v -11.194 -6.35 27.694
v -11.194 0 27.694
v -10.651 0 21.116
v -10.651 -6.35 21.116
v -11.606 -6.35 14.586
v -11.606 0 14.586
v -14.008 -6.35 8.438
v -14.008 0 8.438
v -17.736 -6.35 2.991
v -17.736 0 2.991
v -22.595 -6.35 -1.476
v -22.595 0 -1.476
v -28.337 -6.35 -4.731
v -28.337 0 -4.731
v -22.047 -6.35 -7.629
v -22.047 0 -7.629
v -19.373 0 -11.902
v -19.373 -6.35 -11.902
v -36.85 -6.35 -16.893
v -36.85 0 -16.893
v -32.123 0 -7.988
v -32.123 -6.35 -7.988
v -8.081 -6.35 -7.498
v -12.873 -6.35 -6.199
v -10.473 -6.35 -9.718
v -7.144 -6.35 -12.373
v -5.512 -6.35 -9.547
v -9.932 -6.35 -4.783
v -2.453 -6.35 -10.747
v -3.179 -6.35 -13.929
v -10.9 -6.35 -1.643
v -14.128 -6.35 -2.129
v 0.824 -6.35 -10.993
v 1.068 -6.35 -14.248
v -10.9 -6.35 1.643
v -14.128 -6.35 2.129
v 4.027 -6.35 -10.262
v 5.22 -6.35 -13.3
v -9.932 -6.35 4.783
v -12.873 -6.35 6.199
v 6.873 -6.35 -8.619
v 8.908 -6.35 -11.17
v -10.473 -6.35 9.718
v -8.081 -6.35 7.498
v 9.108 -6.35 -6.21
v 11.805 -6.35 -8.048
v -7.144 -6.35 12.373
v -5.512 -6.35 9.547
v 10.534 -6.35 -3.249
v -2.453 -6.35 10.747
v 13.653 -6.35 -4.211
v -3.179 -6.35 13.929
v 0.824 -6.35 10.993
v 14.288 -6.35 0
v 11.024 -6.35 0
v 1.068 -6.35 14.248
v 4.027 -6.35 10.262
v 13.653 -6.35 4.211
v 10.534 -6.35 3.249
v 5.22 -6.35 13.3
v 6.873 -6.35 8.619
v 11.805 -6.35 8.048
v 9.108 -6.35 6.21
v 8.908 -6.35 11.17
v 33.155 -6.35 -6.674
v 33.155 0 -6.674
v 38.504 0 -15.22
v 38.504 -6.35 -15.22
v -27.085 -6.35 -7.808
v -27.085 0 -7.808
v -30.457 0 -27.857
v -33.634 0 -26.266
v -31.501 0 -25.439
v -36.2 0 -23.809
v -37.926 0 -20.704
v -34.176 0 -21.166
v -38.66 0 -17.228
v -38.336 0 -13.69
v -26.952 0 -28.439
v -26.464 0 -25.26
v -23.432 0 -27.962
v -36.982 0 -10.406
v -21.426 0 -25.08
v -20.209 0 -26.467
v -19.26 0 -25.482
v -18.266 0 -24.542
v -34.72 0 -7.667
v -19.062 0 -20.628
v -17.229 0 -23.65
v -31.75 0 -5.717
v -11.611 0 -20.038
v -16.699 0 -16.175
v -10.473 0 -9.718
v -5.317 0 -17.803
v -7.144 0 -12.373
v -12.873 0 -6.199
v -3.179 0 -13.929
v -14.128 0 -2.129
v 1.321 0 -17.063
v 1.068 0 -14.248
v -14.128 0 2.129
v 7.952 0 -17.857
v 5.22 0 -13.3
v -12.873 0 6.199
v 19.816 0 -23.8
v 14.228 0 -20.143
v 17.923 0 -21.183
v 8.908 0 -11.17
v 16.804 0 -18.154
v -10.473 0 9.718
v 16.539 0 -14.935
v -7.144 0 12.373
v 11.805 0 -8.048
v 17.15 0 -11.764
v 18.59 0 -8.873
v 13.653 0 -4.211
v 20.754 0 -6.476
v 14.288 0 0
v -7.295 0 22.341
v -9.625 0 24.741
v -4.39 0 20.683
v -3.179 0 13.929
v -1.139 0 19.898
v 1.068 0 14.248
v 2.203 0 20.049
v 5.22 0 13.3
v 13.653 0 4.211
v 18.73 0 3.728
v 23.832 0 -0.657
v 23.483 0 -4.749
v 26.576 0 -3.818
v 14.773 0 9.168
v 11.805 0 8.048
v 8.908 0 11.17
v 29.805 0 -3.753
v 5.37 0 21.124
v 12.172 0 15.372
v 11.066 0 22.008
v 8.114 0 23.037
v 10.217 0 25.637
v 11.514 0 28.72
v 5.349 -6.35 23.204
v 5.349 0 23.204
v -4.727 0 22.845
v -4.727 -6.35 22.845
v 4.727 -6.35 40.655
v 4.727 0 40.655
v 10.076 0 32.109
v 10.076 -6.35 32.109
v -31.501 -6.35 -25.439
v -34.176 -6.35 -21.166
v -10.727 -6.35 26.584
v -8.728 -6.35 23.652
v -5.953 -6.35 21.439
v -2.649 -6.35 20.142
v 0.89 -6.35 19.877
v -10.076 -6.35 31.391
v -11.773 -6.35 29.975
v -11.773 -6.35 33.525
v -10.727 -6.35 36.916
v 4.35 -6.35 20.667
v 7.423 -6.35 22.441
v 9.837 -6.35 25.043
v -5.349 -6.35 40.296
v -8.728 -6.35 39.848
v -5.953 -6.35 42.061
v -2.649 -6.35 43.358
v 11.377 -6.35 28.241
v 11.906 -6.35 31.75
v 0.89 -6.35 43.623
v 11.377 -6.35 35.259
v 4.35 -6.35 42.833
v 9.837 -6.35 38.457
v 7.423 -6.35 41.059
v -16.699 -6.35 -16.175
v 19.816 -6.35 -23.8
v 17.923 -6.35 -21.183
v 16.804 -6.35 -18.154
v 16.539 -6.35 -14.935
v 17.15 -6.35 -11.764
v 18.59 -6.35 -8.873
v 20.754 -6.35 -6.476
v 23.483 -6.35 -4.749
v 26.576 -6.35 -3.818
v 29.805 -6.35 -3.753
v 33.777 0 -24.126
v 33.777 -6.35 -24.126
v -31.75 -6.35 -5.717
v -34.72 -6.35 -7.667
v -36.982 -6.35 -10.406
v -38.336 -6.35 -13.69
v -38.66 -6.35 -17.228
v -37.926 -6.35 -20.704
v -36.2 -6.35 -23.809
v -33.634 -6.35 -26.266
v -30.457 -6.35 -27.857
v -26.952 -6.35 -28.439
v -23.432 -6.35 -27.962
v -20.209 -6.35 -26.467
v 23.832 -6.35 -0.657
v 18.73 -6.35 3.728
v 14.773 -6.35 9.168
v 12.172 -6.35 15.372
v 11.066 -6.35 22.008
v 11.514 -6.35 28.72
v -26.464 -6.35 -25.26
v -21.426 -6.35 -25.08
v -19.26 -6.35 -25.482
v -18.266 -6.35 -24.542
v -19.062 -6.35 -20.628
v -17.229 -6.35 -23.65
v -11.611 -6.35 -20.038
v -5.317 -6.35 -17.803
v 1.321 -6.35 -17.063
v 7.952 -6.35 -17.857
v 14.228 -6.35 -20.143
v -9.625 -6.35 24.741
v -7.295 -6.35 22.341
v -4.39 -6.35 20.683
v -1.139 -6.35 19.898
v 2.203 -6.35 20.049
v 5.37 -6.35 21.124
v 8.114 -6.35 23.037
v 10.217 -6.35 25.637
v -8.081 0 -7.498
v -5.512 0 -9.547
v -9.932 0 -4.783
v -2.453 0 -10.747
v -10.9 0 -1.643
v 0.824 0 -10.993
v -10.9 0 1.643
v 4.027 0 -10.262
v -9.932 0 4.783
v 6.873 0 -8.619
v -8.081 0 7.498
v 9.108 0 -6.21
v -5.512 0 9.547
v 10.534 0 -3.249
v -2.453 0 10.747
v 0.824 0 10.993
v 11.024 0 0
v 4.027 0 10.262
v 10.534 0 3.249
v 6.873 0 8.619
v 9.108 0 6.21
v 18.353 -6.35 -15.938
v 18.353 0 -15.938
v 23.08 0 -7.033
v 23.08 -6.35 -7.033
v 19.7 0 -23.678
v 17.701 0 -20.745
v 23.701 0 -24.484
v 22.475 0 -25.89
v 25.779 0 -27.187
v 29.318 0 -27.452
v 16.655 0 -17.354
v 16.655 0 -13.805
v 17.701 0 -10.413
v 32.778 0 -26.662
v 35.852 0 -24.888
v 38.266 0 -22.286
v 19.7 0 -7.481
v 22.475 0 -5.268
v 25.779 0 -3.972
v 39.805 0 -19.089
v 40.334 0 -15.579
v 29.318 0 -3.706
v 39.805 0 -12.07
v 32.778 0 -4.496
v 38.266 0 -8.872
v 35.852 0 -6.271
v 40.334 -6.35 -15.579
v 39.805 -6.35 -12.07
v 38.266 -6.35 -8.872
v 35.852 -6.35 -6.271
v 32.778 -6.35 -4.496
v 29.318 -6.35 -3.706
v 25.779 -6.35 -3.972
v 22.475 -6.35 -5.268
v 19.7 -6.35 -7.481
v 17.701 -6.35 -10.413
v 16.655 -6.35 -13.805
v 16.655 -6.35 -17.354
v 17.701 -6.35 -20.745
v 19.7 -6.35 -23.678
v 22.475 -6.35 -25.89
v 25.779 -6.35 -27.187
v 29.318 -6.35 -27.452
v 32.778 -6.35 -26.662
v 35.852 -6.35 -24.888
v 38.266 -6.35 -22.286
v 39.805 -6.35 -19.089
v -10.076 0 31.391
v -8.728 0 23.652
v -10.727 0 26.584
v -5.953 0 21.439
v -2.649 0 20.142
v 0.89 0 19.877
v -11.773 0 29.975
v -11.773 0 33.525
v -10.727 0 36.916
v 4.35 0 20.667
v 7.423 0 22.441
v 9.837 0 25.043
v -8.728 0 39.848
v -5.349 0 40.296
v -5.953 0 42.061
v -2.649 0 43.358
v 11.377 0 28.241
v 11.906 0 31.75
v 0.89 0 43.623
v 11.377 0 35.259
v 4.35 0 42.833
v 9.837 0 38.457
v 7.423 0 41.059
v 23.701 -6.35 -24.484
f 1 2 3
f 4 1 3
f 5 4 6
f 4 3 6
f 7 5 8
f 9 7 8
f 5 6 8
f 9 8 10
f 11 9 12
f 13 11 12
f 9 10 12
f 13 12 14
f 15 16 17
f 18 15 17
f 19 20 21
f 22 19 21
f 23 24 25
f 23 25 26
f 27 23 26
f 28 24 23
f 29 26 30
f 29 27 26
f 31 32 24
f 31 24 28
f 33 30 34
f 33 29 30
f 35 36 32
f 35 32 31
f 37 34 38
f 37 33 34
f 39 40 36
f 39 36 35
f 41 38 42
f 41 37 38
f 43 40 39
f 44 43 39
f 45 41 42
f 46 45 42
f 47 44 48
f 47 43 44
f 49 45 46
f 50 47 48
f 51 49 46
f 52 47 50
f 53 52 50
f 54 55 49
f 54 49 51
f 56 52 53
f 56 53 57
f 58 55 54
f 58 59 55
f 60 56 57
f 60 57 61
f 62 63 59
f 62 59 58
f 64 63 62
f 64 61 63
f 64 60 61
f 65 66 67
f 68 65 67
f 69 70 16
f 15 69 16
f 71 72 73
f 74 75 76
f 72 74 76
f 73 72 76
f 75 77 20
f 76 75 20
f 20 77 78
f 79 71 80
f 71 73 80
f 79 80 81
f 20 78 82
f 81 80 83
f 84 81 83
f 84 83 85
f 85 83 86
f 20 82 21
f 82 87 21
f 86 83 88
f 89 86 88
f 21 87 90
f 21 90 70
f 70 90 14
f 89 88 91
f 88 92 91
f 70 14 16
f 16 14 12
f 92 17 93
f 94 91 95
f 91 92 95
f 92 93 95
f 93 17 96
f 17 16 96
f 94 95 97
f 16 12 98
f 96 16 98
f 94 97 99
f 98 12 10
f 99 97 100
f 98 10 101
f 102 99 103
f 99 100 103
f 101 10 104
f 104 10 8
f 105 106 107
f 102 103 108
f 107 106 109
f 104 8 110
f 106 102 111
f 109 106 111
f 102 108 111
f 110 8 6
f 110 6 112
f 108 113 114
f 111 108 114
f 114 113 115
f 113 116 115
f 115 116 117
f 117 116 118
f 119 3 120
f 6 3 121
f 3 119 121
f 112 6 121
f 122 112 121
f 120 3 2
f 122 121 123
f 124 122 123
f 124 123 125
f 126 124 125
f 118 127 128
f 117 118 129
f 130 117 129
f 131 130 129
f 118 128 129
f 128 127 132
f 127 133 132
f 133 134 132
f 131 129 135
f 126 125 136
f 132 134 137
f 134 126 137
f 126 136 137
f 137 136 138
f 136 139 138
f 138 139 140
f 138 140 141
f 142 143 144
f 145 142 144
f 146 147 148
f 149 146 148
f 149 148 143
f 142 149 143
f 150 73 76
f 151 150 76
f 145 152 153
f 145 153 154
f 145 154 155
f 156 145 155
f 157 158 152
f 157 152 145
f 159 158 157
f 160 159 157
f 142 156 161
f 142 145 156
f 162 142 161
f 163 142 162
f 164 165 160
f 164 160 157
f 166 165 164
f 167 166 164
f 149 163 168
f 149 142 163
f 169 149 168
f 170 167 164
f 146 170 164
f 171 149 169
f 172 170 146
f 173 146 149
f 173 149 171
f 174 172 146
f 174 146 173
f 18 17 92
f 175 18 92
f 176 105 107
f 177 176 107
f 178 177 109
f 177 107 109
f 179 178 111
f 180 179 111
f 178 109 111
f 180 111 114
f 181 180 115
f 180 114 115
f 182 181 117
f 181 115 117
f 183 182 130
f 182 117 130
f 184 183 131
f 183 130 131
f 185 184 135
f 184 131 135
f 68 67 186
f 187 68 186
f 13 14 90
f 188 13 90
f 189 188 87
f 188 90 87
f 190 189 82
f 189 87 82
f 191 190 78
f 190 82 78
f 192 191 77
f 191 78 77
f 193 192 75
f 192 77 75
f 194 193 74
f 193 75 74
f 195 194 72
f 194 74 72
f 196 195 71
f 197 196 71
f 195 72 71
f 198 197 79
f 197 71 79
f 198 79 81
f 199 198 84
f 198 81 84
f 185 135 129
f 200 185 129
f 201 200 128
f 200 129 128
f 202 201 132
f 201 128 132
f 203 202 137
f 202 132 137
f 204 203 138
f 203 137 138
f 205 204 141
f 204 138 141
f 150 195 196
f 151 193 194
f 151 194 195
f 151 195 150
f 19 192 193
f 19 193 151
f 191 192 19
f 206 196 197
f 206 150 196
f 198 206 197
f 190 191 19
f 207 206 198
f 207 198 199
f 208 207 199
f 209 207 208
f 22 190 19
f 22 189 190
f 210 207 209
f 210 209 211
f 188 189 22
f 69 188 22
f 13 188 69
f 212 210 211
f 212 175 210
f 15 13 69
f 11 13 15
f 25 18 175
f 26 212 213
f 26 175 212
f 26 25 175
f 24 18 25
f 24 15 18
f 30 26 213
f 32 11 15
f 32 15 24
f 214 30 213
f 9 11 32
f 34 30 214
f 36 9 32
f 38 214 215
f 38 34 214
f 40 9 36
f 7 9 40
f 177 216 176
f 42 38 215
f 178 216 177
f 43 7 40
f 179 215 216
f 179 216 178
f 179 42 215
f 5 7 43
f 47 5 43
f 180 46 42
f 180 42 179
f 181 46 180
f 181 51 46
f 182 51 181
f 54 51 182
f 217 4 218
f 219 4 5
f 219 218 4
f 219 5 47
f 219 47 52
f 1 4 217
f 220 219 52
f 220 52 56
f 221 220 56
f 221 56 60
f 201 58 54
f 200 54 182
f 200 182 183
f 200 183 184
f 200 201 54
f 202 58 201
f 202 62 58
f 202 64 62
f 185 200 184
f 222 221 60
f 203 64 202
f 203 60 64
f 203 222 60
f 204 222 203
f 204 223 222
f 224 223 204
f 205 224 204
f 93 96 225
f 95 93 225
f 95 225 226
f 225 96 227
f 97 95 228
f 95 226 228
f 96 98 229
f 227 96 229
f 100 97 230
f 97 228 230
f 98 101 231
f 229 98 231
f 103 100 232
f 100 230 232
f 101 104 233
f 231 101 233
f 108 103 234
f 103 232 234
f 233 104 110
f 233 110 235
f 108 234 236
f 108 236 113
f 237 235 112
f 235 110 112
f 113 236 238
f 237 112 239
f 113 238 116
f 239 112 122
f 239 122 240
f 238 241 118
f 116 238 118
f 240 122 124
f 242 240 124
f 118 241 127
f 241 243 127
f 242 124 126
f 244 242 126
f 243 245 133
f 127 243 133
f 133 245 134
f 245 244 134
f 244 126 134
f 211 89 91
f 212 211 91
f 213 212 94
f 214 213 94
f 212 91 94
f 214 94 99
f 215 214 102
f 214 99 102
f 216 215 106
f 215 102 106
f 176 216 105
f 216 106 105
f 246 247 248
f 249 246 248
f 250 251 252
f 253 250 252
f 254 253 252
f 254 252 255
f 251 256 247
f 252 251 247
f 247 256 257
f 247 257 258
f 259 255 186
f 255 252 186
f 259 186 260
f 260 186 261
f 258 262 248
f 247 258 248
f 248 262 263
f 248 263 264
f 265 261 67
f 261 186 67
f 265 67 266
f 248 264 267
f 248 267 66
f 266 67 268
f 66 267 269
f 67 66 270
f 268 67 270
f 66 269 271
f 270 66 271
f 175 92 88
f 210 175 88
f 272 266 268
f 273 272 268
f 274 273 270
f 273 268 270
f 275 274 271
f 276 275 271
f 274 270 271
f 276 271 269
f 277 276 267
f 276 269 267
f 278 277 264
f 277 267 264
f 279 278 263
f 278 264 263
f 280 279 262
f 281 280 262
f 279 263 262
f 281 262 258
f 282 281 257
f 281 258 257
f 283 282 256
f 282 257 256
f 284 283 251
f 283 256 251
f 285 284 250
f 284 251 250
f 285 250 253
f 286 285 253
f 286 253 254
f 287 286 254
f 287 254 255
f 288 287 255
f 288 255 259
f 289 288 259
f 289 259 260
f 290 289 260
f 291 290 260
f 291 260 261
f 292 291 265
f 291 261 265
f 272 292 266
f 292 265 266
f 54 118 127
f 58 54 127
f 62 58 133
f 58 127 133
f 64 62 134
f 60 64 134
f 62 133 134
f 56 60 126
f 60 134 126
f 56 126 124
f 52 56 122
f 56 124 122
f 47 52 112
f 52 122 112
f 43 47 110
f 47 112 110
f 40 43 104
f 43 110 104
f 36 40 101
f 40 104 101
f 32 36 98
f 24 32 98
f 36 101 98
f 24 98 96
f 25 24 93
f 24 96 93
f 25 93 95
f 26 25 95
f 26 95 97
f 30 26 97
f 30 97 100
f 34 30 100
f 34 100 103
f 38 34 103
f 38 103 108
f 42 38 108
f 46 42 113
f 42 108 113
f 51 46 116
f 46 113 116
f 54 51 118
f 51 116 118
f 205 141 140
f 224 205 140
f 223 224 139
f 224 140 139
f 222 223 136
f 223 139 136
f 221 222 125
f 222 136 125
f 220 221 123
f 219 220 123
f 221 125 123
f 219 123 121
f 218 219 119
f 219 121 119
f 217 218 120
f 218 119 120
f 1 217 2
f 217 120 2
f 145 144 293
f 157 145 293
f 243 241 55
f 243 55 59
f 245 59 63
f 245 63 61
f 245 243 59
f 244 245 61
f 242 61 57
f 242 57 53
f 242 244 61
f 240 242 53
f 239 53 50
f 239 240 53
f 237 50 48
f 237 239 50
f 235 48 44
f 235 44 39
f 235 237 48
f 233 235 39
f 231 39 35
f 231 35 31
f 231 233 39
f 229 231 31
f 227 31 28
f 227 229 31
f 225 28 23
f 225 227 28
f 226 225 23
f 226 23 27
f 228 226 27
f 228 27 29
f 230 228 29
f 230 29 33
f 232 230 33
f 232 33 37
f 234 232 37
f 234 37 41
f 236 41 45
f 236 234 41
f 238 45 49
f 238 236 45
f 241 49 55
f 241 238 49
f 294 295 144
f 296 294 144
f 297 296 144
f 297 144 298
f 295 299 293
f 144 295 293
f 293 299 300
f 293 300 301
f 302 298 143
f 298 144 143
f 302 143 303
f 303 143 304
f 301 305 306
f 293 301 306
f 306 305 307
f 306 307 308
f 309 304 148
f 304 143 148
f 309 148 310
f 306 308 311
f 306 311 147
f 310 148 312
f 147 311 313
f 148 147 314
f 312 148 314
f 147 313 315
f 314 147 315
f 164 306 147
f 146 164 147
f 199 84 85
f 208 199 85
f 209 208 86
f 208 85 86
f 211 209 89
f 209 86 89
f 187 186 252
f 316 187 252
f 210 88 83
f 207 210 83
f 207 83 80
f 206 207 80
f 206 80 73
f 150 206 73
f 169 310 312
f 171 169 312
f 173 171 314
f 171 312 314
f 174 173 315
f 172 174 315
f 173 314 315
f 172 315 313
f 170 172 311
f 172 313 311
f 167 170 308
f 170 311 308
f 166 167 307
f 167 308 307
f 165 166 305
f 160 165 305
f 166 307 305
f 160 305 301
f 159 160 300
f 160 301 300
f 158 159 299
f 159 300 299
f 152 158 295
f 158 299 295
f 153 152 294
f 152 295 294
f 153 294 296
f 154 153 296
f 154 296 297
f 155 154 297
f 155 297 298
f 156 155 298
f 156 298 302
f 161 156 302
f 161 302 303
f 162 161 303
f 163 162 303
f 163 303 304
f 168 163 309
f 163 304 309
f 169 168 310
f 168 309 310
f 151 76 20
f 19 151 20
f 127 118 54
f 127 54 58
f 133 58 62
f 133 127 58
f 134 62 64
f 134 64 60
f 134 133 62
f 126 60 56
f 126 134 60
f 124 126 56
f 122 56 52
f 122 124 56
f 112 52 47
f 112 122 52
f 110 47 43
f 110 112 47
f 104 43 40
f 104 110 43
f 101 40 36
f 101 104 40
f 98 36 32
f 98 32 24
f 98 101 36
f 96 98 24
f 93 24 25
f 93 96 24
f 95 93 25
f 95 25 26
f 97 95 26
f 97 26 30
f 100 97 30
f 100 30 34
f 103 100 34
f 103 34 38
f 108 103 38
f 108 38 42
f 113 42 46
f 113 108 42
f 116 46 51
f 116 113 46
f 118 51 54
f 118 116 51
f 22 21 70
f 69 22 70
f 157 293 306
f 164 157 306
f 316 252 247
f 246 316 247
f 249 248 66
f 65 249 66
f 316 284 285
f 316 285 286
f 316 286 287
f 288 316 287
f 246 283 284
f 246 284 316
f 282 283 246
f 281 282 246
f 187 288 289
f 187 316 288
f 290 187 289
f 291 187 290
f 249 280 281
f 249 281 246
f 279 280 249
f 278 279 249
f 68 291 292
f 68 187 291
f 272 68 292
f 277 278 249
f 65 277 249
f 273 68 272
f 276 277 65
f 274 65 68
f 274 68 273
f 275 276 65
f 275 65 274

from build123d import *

# Parameters (mm, degrees)
F1_R     = 14.2875
F2_DEPTH = 6.35
F0_R     = 14.2875
F0_R_2   = 11.0236
F0_R_3   = 11.90625


with BuildPart() as f2:
    # F1 (on Front) → F2 (new body)
    with BuildSketch(Plane.XZ):
        with BuildLine():
            ThreePointArc((-28.3368777048, -4.7308819237), (-18.9271499683, -7.579703249), (-14.8679894846, -16.5341421028))
            ThreePointArc((-14.8679894846, -16.5341421028), (-15.4735574781, -20.2829252722), (-17.2286614427, -23.6503720675))
            ThreePointArc((-17.2286614427, -23.6503720675), (1.3205598207, -17.0628768568), (19.8158373016, -23.8003402916))
            ThreePointArc((19.8158373016, -23.8003402916), (17.7714590027, -10.2695141575), (29.8045543603, -3.7528160198))
            ThreePointArc((29.8045543603, -3.7528160198), (14.7729985458, 9.1681983), (11.5143026194, 28.7202105268))
            ThreePointArc((11.5143026194, 28.7202105268), (0.537272208, 19.855878442), (-11.1942484754, 27.6944371372))
            ThreePointArc((-11.1942484754, 27.6944371372), (-14.0084057587, 8.4380816184), (-28.3368777048, -4.7308819237))
        make_face()
        Circle(F1_R, mode=Mode.SUBTRACT)
        with BuildLine():
            ThreePointArc((-17.2286614427, -23.6503720675), (-15.4735574781, -20.2829252722), (-14.8679894846, -16.5341421028))
            ThreePointArc((-14.8679894846, -16.5341421028), (-18.9271499683, -7.579703249), (-28.3368777048, -4.7308819237))
            ThreePointArc((-28.3368777048, -4.7308819237), (-37.9263447141, -20.7041946221), (-20.2092368949, -26.4668924802))
            ThreePointArc((-20.2092368949, -26.4668924802), (-18.7686617016, -25.0060241145), (-17.2286614427, -23.6503720675))
        make_face()
        Polygon((-22.047158212, -7.6290309454), (-19.3729022251, -11.902195068), (-16.6986463625, -16.1753589919), (-19.0621871112, -20.6279147825), (-21.425727635, -25.0804701493), (-26.463524163, -25.2598617036), (-31.5013207572, -25.4392532602), (-34.1755766581, -21.166089275), (-36.8498326067, -16.8929252137), (-34.4862918112, -12.440369335), (-32.1227513342, -7.9878140563), (-27.0849547862, -7.8084225013), align=None, mode=Mode.SUBTRACT)
    extrude(amount=F2_DEPTH)


with BuildPart() as f2b:
    # F0 (on Front) → F2, piece 2 (new body)
    with BuildSketch(Plane.XZ):
        Circle(F0_R)
        Circle(F0_R_2, mode=Mode.SUBTRACT)
    extrude(amount=F2_DEPTH)


with BuildPart() as f2c:
    # F0 (on Front) → F2, piece 3 (new body)
    with BuildSketch(Plane.XZ):
        with Locations((0, 31.75)):
            Circle(F0_R_3)
        Polygon((4.7270812726, 40.6551111574), (10.0755931221, 32.1087831109), (5.3485118496, 23.2036719535), (-4.7270812726, 22.8448888426), (-10.0755931221, 31.3912168891), (-5.3485118496, 40.2963280465), align=None, mode=Mode.SUBTRACT)
    extrude(amount=F2_DEPTH)


with BuildPart() as f2d:
    # F0 (on Front) → F2, piece 4 (new body)
    with BuildSketch(Plane.XZ):
        with Locations((28.4281739187, -15.5792426121)):
            Circle(F0_R_3)
        Polygon((38.5037670408, -15.2204595012), (33.7766857683, -24.1255706586), (23.7010926461, -24.4843537695), (18.3525807966, -15.938025723), (23.0796620691, -7.0329145656), (33.1552551912, -6.6741314547), align=None, mode=Mode.SUBTRACT)
    extrude(amount=F2_DEPTH)


solid = Compound([f2.part, f2b.part, f2c.part, f2d.part])
